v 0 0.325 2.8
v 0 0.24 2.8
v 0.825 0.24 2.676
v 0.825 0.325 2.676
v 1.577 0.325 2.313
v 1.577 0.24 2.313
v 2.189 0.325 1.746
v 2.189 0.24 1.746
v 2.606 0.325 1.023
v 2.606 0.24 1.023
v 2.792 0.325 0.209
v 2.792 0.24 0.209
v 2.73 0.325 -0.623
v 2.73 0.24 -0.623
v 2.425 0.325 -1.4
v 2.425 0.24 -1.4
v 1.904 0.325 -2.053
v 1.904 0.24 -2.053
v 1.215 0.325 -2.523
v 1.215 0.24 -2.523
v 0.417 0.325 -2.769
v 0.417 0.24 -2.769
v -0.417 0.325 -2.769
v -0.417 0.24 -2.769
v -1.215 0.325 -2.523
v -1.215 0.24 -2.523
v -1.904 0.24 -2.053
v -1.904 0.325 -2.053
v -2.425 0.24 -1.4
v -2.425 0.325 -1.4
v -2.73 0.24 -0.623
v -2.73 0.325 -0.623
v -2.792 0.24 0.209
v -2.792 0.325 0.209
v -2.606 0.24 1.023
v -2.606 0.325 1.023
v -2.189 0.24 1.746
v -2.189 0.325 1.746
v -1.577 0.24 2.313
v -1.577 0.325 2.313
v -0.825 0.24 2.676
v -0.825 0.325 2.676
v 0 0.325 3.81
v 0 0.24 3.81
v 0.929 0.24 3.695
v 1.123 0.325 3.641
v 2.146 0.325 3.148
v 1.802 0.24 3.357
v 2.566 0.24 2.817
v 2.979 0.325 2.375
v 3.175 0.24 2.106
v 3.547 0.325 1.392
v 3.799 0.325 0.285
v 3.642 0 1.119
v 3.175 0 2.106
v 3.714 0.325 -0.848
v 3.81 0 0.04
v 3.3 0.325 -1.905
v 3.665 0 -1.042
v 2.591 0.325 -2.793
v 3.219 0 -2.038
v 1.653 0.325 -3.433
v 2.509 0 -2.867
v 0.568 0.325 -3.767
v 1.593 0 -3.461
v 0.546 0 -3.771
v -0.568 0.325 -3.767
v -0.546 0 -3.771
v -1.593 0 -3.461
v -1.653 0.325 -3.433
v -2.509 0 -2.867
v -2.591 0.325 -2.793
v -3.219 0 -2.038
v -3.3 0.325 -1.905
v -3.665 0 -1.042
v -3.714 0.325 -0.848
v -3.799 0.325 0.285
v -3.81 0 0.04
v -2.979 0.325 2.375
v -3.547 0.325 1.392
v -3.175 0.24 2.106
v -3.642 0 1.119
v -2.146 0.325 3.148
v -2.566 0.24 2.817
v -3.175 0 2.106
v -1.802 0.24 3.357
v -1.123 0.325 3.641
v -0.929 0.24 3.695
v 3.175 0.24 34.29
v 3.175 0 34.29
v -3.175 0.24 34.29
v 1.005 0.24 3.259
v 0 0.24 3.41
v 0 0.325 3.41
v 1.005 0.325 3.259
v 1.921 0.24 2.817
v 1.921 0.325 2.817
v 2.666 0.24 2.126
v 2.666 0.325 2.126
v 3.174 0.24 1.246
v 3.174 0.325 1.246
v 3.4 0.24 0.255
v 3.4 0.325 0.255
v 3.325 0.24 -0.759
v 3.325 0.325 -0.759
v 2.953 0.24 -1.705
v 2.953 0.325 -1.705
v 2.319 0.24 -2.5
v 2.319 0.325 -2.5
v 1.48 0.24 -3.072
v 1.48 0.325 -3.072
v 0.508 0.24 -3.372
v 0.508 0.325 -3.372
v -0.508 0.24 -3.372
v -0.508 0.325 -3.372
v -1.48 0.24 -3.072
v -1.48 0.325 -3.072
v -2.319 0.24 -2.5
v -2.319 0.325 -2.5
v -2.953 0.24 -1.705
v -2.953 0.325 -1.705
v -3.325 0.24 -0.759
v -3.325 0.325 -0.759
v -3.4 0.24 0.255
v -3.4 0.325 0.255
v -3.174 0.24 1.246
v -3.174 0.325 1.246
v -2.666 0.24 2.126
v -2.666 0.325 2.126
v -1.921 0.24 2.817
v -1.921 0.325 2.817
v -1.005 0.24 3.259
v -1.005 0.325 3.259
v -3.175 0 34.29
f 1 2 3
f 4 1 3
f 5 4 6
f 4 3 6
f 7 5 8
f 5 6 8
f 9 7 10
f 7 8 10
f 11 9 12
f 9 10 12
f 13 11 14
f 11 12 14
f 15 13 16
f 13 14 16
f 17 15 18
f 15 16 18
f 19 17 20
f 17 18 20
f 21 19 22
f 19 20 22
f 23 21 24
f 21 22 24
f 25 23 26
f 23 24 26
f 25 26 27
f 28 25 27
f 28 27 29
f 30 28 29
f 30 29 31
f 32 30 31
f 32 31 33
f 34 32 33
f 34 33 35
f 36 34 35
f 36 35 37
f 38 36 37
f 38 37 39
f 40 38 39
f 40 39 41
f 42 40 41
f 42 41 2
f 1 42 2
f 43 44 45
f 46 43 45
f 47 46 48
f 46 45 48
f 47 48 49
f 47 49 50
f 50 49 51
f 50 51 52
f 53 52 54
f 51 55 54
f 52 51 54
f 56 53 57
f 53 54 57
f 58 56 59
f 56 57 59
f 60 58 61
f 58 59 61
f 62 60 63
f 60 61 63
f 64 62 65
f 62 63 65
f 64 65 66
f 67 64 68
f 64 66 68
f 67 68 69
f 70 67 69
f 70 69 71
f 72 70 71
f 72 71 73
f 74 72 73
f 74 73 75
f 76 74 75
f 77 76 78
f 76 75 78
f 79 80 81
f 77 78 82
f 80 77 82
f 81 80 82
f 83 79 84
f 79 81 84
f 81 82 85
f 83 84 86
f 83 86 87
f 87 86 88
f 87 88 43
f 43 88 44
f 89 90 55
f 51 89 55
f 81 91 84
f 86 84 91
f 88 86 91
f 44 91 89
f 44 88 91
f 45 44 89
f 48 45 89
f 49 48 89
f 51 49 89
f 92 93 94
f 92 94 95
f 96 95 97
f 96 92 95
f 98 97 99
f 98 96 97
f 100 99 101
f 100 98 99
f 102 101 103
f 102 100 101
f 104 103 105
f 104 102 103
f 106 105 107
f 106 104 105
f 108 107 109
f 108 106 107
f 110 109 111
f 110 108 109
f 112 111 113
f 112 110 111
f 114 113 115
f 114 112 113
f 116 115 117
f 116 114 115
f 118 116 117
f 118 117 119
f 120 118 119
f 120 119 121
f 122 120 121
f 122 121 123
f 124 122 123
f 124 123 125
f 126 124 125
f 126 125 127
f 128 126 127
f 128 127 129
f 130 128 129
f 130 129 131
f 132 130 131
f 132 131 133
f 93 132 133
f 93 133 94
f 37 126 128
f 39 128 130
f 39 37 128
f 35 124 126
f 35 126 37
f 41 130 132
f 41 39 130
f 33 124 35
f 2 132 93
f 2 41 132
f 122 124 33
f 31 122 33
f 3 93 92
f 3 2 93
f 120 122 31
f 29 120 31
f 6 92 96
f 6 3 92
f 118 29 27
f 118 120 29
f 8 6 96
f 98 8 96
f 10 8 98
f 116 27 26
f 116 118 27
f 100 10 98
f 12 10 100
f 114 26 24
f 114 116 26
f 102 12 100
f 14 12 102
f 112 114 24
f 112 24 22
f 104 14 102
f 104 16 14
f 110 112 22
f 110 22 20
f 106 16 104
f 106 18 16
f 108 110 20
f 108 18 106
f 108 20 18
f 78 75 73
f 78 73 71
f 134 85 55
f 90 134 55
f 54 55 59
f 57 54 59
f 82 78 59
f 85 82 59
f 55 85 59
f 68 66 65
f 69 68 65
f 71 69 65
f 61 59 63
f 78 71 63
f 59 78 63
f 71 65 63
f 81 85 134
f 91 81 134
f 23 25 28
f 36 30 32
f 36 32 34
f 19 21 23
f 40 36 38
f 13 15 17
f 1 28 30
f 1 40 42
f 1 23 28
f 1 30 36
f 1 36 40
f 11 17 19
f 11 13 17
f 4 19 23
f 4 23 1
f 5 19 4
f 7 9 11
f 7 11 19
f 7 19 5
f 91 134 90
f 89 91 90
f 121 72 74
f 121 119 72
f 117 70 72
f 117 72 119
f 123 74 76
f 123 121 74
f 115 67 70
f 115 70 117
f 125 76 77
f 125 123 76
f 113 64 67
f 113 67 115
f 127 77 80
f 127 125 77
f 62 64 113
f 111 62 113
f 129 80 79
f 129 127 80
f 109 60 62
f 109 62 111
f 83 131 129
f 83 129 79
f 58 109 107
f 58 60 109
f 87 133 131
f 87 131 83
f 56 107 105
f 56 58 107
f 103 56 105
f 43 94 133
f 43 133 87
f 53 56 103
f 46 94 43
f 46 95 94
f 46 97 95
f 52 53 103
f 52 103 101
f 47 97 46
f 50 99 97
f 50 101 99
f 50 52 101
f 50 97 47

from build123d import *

# Parameters (mm, degrees)
SKETCH1_R             = 3.81
SKETCH1_R_2           = 3.41
BOSS_EXTRUDE1_DEPTH   = 0.325
SKETCH1_R_3           = 2.8
BOSS_EXTRUDE1_2_DEPTH = 0.325
SKETCH1_3_R           = 3.41
SKETCH1_3_R_2         = 2.8
BOSS_EXTRUDE2_DEPTH   = 0.24


with BuildPart() as part:
    # Sketch1 → Boss-Extrude1 (new body)
    with BuildSketch(Plane(origin=(0, 0, 0), x_dir=(1, 0, 0), z_dir=(0, 1, 0))):
        Circle(SKETCH1_R)
        Circle(SKETCH1_R_2, mode=Mode.SUBTRACT)
    extrude(amount=BOSS_EXTRUDE1_DEPTH)



with BuildPart() as body_2:
    # Sketch1 → Boss-Extrude1 2 (new body)
    with BuildSketch(Plane(origin=(0, 0, 0), x_dir=(1, 0, 0), z_dir=(0, 1, 0))):
        Circle(SKETCH1_R_3)
    extrude(amount=BOSS_EXTRUDE1_2_DEPTH)


with BuildPart() as part_1:
    add(part.part)

    add(body_2.part)  # Boss-Extrude2 merges body 2
    # Sketch1<3> → Boss-Extrude2 (add)
    # profile 1 of 2: a face of its own
    with BuildSketch(Plane(origin=(0, 0, 0), x_dir=(1, 0, 0), z_dir=(0, 1, 0))):
        with BuildLine():
            Line((-3.175, -2.106056742), (-3.175, -34.29))
            Line((-3.175, -34.29), (3.175, -34.29))
            Line((3.175, -34.29), (3.175, -2.106056742))
            ThreePointArc((3.175, -2.106056742), (0, -3.81), (-3.175, -2.106056742))
        make_face()
    # profile 2 of 2: a face of its own
    with BuildSketch(Plane(origin=(0, 0, 0), x_dir=(1, 0, 0), z_dir=(0, 1, 0))):
        Circle(SKETCH1_3_R)
        Circle(SKETCH1_3_R_2, mode=Mode.SUBTRACT)
    extrude(amount=BOSS_EXTRUDE2_DEPTH)


solid = part_1.part
